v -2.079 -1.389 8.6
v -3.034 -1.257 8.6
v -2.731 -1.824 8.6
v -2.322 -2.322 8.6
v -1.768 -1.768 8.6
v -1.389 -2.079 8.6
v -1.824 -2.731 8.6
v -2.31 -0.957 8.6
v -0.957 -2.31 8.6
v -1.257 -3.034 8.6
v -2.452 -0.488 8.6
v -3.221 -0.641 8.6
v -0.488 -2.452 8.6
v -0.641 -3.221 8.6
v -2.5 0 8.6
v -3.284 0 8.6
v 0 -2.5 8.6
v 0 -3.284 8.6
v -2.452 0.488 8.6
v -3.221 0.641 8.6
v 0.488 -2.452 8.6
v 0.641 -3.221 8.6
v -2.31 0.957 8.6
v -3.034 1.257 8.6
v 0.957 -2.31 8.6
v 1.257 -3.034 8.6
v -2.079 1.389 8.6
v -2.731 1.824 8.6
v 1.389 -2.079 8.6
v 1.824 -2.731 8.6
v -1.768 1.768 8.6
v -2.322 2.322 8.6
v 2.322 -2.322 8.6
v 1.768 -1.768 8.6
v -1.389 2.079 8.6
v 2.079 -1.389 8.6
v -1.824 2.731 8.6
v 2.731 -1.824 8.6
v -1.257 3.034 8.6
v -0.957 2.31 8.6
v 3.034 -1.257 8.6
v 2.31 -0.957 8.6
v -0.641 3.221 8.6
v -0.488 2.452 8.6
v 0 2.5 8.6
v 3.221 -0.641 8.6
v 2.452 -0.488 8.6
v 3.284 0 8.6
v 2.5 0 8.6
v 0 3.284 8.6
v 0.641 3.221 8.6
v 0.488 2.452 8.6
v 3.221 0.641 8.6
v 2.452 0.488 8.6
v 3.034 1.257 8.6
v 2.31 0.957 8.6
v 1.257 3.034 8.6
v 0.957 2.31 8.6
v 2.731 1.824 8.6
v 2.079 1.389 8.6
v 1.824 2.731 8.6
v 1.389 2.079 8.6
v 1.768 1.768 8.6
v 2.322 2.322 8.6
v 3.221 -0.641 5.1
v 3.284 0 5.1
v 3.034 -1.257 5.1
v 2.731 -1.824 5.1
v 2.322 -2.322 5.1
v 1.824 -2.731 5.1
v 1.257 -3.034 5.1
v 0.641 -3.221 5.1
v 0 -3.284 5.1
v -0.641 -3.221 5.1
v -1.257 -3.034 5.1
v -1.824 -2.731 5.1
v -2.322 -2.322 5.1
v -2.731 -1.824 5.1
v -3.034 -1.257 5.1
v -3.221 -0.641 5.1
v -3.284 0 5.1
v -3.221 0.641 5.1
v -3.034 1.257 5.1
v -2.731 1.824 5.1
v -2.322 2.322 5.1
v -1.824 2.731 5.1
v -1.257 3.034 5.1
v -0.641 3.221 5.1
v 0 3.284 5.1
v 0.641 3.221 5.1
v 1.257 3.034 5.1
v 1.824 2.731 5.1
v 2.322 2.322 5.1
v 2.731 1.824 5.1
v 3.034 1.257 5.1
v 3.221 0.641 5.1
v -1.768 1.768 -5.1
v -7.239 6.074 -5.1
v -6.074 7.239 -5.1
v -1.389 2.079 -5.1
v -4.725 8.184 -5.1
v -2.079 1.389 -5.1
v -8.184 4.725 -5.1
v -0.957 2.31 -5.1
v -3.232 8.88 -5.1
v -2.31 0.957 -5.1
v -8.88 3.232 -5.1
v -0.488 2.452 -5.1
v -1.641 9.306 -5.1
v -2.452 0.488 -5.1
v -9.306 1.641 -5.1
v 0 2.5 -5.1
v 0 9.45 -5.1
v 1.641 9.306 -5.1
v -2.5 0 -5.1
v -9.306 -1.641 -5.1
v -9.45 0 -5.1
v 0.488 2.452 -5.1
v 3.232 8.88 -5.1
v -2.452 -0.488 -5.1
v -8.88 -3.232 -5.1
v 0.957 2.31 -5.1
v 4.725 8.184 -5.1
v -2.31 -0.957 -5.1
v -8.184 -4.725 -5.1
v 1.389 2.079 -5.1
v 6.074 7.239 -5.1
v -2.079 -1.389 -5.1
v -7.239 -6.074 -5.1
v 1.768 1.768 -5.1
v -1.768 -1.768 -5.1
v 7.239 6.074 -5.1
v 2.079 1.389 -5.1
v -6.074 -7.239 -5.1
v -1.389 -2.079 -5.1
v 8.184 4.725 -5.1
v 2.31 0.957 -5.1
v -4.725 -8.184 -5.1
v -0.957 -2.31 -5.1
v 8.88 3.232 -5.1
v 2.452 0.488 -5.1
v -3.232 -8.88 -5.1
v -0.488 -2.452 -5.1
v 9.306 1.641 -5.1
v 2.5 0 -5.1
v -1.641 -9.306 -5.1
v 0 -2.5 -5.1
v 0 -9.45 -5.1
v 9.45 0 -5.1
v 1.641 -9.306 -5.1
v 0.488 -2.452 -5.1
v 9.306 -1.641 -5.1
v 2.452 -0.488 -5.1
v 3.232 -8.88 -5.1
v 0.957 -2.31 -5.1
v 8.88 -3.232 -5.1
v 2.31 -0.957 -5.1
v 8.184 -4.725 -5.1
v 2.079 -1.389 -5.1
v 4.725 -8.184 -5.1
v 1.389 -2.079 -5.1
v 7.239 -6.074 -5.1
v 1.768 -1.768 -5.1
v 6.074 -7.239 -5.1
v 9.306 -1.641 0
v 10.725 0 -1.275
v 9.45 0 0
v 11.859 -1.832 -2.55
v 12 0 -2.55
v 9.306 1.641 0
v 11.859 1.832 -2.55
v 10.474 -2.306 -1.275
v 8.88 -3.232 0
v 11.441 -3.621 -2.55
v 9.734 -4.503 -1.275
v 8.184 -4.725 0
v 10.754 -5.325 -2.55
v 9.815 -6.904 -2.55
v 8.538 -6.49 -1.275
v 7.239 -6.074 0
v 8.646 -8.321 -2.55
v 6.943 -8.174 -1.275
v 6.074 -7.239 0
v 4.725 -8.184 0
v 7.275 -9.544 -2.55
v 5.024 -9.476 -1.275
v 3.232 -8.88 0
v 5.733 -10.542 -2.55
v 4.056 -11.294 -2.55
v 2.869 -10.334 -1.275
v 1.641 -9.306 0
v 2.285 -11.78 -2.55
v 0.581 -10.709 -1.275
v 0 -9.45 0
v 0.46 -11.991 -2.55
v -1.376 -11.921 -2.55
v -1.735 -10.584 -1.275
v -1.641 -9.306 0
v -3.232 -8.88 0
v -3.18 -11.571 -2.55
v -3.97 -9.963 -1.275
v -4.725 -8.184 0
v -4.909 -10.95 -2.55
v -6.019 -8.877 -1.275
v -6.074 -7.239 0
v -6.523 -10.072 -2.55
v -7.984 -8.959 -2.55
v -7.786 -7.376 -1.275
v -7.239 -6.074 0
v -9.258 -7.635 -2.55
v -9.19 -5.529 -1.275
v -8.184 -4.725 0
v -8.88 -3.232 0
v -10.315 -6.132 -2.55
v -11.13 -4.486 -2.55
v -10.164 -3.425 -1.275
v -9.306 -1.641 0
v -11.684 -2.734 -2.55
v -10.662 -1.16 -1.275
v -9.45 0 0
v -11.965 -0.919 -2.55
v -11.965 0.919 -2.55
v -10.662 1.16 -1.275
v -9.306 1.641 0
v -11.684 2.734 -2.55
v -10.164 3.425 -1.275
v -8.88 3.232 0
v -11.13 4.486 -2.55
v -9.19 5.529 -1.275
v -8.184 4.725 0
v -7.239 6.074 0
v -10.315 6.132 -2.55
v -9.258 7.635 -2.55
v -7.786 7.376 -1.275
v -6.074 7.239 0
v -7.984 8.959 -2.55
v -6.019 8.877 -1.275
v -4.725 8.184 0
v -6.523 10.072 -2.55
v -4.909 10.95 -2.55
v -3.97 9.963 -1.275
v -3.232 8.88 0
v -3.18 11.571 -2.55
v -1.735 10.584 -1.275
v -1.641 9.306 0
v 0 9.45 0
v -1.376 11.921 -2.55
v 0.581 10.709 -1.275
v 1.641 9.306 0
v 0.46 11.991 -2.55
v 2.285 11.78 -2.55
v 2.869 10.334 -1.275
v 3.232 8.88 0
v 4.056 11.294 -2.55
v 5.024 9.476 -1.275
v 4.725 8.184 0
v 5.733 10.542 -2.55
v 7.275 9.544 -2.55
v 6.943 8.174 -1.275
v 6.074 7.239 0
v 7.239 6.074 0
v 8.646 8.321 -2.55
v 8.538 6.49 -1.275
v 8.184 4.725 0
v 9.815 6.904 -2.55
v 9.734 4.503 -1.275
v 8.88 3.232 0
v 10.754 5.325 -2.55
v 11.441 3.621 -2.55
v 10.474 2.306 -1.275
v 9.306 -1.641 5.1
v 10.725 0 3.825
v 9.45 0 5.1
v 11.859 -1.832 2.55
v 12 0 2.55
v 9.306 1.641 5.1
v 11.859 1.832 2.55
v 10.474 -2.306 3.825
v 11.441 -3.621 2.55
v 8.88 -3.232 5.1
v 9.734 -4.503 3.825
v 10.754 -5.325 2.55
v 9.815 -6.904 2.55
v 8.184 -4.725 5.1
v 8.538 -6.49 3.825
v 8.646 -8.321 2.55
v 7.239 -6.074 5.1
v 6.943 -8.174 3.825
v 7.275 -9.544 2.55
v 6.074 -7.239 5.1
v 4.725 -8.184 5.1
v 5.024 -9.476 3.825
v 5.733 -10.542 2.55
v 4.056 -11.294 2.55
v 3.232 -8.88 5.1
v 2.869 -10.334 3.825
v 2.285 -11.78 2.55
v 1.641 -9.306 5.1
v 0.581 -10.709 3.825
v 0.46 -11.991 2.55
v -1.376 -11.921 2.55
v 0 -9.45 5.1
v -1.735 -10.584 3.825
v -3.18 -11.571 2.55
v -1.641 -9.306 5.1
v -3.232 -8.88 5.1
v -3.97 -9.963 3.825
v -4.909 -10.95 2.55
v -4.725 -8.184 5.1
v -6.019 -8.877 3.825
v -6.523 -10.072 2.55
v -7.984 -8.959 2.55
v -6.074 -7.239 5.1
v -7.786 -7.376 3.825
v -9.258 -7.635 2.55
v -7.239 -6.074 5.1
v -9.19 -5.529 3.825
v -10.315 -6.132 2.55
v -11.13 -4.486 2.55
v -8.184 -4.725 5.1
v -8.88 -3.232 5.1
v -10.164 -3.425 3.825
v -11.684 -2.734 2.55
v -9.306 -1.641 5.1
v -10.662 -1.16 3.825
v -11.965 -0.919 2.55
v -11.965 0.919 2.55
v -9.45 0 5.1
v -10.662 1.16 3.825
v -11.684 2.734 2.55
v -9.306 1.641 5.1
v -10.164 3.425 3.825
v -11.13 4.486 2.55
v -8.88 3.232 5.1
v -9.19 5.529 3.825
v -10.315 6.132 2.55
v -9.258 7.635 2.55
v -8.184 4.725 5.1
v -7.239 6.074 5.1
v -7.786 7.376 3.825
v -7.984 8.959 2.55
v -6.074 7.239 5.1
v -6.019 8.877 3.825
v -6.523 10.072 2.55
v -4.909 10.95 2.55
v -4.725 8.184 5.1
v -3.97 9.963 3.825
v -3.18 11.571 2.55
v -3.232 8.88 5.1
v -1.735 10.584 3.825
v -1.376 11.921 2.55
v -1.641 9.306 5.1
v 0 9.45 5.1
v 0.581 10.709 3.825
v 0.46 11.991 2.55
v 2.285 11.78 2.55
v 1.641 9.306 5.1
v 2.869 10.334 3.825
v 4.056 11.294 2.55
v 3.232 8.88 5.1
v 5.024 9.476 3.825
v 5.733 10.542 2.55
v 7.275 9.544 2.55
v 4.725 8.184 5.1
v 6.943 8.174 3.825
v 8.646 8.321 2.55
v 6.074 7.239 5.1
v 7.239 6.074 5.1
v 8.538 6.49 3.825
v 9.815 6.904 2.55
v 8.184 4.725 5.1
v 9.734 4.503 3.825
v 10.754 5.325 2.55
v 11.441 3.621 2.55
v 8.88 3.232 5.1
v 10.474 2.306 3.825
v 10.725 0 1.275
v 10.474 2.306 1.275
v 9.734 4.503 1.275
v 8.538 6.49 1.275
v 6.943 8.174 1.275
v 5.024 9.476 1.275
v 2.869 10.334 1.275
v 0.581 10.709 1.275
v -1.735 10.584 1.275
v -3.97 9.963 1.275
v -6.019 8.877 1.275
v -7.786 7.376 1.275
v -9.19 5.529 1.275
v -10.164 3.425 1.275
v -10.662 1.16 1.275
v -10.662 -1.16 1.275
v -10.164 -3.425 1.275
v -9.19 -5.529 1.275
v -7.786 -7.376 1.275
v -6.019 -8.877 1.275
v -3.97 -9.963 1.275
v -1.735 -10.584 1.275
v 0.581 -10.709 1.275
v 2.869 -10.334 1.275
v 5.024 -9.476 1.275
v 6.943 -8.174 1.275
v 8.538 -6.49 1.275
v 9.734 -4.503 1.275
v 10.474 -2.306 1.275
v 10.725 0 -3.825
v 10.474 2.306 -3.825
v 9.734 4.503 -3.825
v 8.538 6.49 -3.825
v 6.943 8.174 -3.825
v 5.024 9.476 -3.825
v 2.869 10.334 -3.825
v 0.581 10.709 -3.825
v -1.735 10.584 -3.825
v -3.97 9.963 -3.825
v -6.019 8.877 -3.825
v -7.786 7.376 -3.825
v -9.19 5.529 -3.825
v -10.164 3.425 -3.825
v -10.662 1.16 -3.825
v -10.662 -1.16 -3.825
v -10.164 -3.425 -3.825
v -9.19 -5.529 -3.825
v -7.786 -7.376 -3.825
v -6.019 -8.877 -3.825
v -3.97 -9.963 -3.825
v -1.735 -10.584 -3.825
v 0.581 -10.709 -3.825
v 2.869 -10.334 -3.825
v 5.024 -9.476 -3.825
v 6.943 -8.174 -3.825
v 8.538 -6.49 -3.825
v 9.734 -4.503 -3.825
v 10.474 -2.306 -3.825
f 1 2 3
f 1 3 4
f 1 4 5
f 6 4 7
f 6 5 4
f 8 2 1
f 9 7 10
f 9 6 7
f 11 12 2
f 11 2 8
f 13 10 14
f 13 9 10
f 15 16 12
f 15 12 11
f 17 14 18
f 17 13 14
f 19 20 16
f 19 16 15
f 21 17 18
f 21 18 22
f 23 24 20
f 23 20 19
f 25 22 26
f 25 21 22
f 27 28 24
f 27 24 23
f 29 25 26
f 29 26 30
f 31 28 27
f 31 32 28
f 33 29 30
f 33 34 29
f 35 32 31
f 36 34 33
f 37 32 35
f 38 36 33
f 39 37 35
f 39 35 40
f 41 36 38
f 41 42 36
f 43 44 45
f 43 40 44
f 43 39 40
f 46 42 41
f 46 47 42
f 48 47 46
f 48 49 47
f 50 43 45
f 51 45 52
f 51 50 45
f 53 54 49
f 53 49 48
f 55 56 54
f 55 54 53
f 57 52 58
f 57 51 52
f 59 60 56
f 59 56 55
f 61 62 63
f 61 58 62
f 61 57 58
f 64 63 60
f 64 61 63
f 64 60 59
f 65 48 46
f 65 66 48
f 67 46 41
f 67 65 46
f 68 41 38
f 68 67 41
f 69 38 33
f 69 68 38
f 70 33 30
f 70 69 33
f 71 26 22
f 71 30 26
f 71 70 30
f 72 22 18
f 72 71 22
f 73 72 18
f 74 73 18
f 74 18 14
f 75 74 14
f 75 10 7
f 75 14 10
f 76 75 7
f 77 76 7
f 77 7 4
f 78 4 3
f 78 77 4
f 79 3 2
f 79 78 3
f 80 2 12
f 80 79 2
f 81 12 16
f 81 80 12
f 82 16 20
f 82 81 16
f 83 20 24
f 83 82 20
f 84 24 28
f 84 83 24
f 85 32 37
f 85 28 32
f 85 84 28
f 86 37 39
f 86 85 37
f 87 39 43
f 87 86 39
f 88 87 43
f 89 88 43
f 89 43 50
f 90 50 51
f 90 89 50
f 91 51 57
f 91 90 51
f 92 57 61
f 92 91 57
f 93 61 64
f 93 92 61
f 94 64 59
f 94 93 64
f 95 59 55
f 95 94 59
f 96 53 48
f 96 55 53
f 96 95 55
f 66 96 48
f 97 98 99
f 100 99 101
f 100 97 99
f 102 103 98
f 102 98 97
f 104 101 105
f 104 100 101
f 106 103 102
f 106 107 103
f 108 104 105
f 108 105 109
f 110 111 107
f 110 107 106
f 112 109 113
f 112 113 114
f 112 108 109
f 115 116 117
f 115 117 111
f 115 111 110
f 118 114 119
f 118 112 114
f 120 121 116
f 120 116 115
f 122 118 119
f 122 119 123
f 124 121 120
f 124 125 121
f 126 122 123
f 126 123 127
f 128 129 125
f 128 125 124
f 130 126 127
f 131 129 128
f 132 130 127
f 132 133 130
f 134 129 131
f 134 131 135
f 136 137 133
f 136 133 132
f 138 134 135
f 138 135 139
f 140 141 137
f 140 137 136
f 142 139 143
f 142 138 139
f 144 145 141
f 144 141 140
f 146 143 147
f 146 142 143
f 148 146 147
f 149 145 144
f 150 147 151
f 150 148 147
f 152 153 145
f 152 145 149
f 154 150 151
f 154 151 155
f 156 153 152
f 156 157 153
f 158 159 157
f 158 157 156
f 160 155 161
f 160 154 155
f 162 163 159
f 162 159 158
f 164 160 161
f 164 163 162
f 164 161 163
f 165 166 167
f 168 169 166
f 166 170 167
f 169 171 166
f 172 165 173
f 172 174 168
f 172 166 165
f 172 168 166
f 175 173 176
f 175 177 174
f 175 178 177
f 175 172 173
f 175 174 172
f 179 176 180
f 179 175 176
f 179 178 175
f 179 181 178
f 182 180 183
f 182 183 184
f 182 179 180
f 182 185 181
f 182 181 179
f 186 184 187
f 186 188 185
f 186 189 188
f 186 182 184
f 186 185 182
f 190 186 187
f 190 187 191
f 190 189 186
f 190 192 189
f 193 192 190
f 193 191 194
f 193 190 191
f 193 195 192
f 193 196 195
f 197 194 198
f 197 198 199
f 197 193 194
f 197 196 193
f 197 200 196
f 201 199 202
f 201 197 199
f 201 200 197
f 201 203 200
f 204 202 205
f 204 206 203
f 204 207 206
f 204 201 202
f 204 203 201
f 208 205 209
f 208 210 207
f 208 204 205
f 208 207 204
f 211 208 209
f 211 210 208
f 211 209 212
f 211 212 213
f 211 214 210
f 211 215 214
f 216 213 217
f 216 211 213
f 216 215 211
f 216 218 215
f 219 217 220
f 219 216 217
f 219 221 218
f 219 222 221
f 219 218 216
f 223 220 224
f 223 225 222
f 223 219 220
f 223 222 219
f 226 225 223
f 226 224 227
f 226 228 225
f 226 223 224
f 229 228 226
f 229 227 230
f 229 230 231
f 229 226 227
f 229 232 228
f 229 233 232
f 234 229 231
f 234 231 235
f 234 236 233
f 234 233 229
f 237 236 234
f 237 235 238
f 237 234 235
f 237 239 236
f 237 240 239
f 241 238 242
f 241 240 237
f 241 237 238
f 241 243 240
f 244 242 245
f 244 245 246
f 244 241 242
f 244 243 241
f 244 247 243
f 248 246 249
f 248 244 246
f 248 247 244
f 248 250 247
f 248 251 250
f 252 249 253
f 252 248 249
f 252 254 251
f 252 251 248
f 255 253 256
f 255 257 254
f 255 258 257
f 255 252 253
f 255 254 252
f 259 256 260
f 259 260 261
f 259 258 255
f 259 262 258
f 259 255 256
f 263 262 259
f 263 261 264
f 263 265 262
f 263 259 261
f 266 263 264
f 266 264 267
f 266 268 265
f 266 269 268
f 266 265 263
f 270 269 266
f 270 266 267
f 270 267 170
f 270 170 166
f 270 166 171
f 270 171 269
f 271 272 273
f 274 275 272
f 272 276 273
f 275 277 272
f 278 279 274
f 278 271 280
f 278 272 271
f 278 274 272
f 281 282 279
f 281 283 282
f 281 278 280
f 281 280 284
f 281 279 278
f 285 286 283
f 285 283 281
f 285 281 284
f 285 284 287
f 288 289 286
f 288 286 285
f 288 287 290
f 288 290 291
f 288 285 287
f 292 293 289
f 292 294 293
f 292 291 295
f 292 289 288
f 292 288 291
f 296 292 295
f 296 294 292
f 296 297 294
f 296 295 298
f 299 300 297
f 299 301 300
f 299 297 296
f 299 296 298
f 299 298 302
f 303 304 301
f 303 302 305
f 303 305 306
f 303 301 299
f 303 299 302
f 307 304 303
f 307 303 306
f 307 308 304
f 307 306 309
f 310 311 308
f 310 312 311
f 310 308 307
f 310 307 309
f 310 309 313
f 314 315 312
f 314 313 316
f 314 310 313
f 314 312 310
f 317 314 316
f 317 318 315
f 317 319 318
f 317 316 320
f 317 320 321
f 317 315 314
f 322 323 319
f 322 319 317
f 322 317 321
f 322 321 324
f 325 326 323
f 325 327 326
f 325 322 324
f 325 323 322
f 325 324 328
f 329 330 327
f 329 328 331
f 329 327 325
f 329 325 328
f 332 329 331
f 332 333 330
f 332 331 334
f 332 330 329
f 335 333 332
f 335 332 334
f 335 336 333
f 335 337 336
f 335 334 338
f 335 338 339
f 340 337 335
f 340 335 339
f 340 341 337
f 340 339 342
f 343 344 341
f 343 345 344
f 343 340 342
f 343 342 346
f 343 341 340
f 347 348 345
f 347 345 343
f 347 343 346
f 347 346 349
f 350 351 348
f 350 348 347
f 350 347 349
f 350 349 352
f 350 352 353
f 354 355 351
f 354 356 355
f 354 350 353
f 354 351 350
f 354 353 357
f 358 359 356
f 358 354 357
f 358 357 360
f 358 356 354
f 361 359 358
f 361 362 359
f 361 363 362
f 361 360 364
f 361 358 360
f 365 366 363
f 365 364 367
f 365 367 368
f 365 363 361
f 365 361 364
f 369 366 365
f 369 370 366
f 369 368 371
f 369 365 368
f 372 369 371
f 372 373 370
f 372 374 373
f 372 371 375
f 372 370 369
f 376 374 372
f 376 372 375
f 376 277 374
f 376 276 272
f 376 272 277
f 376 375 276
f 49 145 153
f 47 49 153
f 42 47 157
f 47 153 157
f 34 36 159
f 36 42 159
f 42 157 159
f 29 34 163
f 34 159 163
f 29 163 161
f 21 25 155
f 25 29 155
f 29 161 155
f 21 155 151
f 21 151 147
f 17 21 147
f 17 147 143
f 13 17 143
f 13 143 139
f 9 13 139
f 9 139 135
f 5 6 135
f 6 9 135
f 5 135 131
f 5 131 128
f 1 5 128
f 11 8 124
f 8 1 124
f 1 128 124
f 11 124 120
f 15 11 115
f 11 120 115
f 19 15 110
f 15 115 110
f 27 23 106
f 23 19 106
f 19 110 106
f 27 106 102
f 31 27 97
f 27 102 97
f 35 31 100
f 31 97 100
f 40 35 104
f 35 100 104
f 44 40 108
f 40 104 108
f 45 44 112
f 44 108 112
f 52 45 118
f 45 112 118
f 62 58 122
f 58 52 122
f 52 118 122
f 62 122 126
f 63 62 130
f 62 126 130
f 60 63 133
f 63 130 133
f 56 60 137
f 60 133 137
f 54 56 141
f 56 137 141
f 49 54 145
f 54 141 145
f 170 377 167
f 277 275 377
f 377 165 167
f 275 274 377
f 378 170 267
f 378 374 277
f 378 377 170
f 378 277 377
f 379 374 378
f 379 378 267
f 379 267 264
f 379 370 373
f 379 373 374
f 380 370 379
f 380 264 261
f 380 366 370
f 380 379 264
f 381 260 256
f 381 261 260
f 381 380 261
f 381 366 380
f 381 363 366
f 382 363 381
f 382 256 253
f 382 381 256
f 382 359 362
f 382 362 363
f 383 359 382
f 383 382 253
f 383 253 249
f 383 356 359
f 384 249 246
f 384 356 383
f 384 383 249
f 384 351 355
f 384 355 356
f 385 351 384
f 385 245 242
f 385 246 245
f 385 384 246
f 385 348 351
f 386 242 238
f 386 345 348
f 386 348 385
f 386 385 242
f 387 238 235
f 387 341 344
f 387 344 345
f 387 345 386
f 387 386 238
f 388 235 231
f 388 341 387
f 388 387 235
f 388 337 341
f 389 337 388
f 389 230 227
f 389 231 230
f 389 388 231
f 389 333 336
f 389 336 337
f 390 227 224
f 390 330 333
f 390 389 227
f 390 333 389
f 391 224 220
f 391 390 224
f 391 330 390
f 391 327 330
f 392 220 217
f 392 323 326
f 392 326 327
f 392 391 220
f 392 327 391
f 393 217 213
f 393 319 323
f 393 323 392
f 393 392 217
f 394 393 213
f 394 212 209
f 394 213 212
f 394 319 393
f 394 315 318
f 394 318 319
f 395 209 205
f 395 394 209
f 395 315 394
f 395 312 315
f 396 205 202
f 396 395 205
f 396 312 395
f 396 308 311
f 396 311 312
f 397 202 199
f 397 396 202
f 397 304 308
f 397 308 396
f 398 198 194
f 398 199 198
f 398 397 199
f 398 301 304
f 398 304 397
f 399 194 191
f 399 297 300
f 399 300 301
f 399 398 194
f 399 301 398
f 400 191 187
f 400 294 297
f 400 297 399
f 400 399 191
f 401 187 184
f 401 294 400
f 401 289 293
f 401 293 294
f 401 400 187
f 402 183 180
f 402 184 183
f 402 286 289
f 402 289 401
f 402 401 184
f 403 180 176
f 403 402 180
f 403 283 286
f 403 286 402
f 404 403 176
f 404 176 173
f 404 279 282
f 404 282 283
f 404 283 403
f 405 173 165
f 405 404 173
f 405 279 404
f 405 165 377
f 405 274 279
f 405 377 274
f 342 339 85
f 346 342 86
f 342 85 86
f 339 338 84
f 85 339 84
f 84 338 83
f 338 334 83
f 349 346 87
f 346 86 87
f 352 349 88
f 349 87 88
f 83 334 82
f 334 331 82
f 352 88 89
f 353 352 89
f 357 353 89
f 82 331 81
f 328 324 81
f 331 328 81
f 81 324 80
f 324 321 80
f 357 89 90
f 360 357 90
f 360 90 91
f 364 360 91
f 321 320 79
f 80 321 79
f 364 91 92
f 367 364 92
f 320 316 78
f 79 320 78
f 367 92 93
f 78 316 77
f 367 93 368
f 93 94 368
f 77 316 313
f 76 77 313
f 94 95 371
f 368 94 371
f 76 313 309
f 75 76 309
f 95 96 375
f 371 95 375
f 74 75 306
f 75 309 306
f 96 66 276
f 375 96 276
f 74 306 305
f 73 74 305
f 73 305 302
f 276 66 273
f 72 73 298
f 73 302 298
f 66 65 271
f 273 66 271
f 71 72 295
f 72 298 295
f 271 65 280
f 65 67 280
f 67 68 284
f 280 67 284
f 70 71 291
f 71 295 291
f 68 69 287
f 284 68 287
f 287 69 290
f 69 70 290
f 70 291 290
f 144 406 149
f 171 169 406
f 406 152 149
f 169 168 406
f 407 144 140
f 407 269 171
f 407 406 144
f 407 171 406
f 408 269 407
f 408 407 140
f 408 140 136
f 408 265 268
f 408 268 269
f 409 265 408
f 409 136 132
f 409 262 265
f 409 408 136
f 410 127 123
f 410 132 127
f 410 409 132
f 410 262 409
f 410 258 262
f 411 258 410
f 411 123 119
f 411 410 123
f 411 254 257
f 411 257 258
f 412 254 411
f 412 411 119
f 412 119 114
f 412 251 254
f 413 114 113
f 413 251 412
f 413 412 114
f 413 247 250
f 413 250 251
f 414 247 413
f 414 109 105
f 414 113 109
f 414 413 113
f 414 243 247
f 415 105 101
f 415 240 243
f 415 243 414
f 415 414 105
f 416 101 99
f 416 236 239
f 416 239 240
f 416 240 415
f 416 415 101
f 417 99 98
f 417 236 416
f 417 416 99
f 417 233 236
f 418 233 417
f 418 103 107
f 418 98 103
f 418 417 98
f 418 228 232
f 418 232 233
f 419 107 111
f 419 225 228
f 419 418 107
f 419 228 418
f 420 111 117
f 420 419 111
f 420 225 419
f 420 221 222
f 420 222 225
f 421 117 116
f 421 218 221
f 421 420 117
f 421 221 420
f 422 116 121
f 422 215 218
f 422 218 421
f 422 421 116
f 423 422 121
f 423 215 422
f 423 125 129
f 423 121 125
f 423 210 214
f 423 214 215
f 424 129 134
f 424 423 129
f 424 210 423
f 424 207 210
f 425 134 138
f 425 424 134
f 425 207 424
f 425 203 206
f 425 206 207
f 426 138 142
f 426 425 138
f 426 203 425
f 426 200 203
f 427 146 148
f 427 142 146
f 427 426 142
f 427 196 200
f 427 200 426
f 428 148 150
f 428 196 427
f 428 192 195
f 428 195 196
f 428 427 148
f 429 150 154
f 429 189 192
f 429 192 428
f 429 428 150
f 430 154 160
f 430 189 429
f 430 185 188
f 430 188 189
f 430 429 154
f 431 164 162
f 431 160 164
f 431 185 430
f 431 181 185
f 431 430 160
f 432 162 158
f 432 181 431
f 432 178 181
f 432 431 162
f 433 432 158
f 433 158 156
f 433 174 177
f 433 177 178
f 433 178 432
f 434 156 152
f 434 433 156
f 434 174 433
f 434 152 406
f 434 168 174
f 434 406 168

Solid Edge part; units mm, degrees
sketch "Sketch1" plane through (0, 0, 0) normal (0, -1, 0) x (1, 0, 0)
  line L0 (12, 2.55) -> (9.45, 5.1)
  line L1 (0, 5.1) -> (9.45, 5.1)
  line L2 (0, 0) -> (0, 5.1)
  line L3 (0, 0) -> (0, -5.1)
  line L4 (0, -5.1) -> (9.45, -5.1)
  line L5 (12, -2.55) -> (9.45, -5.1)
  line L6 (12, -2.55) -> (9.45, 0)
  line L7 (12, 2.55) -> (9.45, 0)
revolve "RevolvedProtrusion1" add sketch "Sketch1" angle 360 about axis through (0, 0, 0) along (0, 0, -1)
sketch "Sketch2" plane through (0, 0, 5.1) normal (0, 0, 1) x (1, 0, 0)
  circle A0 centre (0, 0) radius 2.5
extrude "Cutout1" cut sketch "Sketch2" against normal up to vertex (10.2 mm away)
sketch "Sketch3" plane through (0, 0, 5.1) normal (0, 0, 1) x (1, 0, 0)
  circle A0 centre (0, 0) radius 3.284
  circle A1 centre (0, 0) radius 2.5
extrude "Protrusion1" add sketch "Sketch3" along normal blind 3.5
